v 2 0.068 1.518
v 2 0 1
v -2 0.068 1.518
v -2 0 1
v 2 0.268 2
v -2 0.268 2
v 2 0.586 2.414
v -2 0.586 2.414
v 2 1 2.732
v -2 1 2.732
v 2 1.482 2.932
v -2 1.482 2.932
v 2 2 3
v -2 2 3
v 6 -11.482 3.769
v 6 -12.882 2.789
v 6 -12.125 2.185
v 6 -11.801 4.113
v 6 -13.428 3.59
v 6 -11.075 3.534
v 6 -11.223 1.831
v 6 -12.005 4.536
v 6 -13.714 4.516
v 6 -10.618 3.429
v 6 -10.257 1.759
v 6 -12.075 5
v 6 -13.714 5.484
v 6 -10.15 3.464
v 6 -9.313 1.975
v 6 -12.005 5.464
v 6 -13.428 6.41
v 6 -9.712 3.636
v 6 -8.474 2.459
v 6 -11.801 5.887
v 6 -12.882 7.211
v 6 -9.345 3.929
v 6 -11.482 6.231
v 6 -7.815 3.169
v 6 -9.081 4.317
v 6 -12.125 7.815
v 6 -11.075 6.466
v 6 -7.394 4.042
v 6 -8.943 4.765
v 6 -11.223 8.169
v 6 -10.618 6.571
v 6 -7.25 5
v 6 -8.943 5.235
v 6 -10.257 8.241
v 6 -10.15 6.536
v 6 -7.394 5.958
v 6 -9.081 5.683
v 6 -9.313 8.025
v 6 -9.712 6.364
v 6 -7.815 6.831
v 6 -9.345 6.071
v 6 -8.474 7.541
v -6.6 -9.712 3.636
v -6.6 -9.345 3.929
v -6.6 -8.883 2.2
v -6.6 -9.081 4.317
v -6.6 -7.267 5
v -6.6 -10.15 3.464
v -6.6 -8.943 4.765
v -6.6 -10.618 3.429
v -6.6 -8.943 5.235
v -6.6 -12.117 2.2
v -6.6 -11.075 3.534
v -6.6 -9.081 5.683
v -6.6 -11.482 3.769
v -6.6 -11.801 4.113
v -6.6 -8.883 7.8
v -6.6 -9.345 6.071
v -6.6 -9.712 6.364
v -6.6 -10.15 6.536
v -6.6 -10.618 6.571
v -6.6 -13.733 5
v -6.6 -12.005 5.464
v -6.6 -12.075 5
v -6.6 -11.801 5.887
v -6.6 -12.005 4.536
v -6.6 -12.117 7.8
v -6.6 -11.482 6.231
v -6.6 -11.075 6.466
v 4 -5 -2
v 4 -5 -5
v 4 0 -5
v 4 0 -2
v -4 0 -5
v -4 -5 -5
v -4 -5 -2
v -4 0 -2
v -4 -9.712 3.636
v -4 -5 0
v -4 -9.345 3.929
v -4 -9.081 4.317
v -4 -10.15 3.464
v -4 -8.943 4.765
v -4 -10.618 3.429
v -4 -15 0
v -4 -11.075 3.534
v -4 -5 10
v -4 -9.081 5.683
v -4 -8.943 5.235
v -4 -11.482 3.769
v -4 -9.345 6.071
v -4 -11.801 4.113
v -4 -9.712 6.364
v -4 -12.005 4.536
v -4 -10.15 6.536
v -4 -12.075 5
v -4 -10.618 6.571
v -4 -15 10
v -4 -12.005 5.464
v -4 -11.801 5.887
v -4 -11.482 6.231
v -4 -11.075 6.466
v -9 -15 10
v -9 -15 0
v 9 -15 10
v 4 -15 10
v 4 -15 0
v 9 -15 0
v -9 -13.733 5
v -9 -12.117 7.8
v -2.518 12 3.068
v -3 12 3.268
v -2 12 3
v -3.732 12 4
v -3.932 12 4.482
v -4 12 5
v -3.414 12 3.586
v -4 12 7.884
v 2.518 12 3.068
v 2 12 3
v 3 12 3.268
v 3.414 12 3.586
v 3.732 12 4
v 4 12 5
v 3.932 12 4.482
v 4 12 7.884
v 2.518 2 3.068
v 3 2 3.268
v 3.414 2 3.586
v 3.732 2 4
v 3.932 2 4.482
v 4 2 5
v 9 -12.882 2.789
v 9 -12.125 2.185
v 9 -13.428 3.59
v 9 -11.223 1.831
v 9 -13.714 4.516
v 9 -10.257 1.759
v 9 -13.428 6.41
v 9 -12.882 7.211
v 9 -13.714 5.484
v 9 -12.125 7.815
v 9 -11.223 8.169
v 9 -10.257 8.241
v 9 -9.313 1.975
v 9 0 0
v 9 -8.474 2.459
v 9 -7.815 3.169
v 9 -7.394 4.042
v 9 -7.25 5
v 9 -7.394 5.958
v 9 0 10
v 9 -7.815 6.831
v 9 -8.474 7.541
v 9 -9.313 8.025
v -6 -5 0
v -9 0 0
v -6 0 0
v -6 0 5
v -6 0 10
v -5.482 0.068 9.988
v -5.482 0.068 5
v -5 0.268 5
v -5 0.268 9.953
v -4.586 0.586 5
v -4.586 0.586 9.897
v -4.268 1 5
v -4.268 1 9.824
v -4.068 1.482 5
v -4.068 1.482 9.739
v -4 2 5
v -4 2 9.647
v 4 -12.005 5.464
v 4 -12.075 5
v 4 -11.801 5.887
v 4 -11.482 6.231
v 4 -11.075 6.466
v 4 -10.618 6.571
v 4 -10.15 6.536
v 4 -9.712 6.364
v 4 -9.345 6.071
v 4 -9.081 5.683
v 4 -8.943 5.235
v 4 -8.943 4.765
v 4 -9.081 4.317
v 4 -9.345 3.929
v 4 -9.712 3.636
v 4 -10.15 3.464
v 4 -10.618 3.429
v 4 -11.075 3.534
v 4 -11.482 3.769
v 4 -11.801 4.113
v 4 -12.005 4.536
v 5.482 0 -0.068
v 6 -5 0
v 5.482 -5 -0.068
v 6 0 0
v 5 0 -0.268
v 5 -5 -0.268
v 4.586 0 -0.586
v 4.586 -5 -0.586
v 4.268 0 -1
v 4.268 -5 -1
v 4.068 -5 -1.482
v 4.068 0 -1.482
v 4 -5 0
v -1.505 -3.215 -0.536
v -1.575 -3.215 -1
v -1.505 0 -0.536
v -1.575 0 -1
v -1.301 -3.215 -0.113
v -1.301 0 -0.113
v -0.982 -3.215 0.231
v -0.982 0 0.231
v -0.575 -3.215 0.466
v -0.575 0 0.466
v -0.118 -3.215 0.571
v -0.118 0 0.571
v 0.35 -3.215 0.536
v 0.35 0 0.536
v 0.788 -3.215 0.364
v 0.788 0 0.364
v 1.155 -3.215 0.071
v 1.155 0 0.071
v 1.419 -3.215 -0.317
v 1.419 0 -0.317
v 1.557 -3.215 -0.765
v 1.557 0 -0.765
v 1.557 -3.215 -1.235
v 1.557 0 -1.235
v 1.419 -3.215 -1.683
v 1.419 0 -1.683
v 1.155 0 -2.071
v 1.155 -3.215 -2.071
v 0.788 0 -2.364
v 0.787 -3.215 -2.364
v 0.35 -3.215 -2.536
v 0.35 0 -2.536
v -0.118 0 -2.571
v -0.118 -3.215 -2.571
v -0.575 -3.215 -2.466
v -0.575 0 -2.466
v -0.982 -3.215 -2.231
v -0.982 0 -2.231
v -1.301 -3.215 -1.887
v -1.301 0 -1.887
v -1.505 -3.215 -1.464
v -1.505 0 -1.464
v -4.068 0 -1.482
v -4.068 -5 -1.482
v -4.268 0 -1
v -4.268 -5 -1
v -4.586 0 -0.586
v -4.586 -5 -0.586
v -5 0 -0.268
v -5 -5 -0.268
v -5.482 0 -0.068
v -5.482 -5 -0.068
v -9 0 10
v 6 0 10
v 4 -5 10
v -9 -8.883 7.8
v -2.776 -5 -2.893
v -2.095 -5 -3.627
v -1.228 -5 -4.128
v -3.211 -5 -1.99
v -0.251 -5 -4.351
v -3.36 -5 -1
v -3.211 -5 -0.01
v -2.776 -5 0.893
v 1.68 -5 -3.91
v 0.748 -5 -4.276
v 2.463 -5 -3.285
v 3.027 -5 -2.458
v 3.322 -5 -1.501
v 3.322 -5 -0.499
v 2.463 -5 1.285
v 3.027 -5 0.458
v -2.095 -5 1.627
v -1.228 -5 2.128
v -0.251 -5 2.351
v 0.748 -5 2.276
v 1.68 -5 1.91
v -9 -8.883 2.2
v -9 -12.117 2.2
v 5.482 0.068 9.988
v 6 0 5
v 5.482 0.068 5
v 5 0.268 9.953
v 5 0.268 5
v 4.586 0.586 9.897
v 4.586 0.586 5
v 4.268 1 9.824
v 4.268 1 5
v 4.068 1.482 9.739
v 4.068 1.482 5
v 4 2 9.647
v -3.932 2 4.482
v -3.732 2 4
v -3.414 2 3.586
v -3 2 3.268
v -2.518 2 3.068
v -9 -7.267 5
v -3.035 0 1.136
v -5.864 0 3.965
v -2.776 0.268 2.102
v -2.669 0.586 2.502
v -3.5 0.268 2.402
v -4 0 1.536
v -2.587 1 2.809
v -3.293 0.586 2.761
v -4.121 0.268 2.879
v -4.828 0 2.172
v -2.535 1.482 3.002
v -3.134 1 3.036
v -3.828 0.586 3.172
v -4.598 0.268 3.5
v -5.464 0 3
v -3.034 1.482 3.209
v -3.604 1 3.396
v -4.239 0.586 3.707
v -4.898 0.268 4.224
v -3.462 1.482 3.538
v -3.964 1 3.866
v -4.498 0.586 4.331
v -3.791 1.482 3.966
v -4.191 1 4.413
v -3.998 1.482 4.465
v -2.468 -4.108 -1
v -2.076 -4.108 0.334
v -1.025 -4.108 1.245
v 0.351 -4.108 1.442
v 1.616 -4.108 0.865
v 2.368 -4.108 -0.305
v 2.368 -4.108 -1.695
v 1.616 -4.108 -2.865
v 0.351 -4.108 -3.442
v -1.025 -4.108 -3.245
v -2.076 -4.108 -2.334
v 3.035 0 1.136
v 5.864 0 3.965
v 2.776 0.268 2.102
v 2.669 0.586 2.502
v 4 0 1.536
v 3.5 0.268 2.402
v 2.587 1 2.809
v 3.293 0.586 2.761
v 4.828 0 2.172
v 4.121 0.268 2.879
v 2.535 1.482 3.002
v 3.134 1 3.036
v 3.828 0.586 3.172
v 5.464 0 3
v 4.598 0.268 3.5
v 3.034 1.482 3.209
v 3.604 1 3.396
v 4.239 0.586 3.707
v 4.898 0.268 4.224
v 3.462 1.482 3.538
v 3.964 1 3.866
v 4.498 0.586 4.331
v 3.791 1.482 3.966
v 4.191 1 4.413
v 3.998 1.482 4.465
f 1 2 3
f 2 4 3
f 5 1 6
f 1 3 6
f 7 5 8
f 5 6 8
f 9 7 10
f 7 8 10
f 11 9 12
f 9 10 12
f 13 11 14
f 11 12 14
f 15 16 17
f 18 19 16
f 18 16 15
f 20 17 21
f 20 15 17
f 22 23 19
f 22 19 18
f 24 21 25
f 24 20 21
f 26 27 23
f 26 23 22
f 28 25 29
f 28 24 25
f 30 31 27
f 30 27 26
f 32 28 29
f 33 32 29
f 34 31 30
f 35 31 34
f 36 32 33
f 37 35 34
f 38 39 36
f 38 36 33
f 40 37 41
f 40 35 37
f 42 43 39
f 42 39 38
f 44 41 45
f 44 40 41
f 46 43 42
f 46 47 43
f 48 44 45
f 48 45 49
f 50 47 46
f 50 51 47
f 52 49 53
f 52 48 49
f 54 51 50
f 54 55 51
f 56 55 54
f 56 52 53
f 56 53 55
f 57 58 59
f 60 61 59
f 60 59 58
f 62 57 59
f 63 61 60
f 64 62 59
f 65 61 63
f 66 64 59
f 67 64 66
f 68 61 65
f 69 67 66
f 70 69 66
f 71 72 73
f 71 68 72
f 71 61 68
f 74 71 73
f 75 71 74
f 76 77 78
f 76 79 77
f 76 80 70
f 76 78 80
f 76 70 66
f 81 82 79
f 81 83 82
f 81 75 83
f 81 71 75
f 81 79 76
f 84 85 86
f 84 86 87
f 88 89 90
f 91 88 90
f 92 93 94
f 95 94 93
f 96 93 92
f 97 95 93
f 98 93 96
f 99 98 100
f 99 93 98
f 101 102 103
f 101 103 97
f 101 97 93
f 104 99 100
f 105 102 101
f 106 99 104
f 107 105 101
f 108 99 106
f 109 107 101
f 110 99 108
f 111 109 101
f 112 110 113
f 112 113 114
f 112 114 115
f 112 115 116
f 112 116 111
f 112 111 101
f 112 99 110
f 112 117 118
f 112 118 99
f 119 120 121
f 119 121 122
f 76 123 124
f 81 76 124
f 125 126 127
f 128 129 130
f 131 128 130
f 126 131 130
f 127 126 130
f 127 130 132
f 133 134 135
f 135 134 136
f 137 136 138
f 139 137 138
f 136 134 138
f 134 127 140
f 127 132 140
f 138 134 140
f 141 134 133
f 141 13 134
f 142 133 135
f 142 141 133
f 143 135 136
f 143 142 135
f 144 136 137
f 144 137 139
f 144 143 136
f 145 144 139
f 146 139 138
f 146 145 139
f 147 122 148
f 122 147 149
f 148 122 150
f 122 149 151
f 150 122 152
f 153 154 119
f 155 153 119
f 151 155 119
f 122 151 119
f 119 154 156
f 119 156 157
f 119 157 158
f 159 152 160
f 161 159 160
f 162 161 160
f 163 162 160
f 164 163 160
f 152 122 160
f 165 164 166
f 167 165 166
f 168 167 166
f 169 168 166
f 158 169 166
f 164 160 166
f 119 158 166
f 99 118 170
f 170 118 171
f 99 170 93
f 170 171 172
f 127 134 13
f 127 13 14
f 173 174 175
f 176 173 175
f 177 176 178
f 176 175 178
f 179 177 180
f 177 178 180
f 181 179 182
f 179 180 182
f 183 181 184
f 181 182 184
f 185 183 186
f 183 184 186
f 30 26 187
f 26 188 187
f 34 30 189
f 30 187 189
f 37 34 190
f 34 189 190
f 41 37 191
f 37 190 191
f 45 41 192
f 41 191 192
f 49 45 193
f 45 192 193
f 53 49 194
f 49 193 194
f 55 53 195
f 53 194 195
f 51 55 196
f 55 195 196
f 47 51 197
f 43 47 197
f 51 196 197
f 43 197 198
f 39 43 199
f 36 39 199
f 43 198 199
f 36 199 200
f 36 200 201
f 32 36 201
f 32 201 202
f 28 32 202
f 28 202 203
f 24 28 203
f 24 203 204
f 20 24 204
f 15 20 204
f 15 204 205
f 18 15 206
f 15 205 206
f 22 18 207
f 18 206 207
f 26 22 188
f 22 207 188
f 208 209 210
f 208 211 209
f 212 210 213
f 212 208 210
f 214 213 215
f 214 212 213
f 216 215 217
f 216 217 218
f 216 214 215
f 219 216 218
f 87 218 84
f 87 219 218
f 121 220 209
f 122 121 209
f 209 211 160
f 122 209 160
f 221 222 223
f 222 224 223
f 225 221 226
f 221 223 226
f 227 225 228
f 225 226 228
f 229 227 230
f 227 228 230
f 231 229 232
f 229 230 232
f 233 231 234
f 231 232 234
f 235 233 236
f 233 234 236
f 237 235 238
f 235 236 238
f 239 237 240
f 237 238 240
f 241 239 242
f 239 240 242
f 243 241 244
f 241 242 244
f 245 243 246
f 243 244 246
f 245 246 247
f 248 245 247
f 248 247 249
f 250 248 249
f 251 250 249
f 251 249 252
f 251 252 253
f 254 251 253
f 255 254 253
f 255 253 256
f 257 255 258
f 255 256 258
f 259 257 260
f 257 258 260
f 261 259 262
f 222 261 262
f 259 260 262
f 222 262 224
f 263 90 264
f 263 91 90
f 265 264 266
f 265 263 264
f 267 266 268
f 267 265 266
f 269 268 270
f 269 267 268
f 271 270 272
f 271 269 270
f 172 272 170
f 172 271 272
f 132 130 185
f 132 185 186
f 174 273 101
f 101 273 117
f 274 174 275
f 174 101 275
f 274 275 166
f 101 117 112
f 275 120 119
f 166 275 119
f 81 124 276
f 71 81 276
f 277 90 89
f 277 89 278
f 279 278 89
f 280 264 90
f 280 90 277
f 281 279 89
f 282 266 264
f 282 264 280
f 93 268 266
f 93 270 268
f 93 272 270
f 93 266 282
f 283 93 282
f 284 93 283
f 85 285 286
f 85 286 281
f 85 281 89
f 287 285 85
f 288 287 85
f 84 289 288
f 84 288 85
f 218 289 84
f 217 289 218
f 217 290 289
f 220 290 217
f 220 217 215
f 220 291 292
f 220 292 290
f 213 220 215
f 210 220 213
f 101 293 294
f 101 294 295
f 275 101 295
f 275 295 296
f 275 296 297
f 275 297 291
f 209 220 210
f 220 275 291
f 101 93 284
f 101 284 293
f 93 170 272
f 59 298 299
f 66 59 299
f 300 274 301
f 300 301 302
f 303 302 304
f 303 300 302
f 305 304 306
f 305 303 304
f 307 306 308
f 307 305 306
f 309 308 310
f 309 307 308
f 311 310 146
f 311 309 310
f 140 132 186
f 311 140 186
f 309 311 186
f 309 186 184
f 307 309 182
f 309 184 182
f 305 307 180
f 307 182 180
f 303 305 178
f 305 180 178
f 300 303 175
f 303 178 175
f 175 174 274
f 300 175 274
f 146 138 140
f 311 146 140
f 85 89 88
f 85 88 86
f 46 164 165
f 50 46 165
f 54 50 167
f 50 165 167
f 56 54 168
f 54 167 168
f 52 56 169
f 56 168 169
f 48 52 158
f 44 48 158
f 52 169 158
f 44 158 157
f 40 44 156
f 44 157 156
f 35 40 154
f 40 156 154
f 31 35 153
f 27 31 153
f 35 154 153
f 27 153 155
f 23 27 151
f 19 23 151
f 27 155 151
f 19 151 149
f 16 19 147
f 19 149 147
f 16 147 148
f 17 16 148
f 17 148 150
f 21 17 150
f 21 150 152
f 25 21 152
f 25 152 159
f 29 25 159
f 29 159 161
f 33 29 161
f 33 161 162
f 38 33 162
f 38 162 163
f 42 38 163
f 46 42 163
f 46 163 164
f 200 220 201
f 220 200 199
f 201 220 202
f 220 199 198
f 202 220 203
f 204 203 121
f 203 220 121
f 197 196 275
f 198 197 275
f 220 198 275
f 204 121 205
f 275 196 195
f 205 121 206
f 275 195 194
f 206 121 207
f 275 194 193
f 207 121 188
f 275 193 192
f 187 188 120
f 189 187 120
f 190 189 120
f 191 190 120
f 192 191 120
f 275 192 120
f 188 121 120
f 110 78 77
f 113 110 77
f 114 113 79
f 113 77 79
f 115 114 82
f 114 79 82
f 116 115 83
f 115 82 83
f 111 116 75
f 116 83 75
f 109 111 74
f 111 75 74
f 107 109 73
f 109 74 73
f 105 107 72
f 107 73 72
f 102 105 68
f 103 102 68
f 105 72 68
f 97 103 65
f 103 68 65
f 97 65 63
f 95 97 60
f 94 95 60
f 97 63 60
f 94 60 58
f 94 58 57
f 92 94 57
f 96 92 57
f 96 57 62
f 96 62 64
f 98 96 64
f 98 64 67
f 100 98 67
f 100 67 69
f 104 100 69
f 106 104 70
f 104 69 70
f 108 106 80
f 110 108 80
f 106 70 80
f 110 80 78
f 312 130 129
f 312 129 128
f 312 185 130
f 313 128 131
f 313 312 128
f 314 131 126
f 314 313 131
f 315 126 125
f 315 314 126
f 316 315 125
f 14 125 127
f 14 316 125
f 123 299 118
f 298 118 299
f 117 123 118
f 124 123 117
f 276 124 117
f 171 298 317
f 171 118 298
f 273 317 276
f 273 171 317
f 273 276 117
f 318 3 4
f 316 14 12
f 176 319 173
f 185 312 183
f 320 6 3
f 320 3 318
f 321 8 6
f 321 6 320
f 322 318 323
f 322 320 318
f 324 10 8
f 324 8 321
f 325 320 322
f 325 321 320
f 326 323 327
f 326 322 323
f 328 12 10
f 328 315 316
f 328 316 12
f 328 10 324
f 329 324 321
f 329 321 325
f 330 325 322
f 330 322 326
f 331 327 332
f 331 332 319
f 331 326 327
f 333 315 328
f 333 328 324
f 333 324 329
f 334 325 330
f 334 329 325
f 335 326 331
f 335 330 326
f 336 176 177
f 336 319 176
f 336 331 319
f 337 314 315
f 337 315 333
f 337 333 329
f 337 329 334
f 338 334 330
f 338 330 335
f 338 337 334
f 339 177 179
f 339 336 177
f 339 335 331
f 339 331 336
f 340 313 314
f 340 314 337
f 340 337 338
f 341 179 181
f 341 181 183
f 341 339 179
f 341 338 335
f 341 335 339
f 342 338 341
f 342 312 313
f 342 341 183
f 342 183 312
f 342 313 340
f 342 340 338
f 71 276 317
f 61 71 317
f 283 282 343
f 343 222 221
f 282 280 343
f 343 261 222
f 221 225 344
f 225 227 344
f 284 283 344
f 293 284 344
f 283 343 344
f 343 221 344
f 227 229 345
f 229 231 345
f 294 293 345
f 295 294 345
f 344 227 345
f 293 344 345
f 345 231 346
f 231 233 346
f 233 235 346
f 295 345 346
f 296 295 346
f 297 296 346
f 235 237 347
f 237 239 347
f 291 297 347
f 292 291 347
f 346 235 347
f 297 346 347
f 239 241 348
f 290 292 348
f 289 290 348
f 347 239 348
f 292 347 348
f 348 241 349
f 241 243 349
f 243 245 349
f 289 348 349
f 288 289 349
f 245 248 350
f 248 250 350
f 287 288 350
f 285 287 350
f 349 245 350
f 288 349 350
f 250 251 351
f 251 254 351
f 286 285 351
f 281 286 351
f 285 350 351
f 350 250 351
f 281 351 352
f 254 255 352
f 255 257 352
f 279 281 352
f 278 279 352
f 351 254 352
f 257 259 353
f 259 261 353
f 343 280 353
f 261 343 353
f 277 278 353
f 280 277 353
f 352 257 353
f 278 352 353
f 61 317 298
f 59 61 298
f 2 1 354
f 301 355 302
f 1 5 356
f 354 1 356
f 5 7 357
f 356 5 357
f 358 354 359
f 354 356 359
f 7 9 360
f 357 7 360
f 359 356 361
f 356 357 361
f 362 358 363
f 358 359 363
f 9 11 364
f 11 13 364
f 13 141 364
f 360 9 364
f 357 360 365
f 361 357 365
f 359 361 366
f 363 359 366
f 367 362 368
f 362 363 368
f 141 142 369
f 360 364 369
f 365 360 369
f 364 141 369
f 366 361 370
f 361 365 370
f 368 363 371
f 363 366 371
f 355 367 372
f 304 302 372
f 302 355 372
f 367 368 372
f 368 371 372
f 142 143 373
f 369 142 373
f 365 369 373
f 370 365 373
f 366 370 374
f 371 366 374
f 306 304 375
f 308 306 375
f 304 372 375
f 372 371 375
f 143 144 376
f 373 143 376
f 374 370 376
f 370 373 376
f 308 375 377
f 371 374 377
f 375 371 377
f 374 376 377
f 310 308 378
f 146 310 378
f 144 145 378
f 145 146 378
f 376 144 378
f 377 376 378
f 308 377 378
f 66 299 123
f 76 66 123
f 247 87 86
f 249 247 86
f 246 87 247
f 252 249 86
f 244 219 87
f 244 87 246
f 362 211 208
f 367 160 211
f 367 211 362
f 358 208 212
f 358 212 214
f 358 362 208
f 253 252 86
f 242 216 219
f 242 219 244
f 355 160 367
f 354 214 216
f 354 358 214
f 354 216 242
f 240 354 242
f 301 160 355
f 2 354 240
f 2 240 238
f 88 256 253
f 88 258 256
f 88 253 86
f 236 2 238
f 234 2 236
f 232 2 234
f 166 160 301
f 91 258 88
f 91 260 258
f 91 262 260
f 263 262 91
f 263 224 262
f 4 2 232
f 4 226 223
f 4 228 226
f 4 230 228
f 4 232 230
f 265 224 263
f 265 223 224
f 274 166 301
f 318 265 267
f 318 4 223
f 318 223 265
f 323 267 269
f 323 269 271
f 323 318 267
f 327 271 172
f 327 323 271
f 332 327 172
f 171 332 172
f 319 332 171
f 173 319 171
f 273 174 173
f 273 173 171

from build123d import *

# Parameters (mm, degrees)
F0_W            = 18
F0_H            = 10
F1_DEPTH        = 15
F2_W            = 8
F2_H            = 10
F3_DEPTH        = 10
F5_D            = 3.15
F5_CBORE_D      = 6.5
F5_CBORE_DEPTH  = 3
F7_DEPTH        = 2.4
F8_W            = 8
F8_H            = 15
F9_DEPTH        = 17
F10_W           = 8
F10_H           = 8
F11_DEPTH       = 12
F13_D           = 3.15
F13_CSINK_D     = 6.72
F13_CSINK_ANGLE = 90
F15_DEPTH       = 25
F16_R           = 2


with BuildPart() as f1:
    # F0 (on Front) → F1 (new body)
    with BuildSketch(Plane.XZ):
        with Locations((0, 5)):
            Rectangle(F0_W, F0_H)
    extrude(amount=F1_DEPTH)

    # F2 (on face) → F3 (cut)
    with BuildSketch(Plane.XZ.offset(15)):
        with Locations((0, 5)):
            Rectangle(F2_W, F2_H)
    extrude(amount=-F3_DEPTH, mode=Mode.SUBTRACT)

    # F5 (through all)
    with Locations(Plane.YZ.offset(9)):
        with Locations((-10.5, 5)):
            CounterBoreHole(F5_D / 2, F5_CBORE_D / 2, F5_CBORE_DEPTH)

    # F6 (on face) → F7 (cut)
    with BuildSketch(Plane(origin=(-9, 0, 0), x_dir=(0, -1, 0), z_dir=(-1, 0, 0))):
        Polygon((12.1165807537, 2.2), (13.7331615075, 5), (12.1165807537, 7.8), (8.8834192463, 7.8), (7.2668384925, 5), (8.8834192463, 2.2), align=None)
    extrude(amount=-F7_DEPTH, mode=Mode.SUBTRACT)

    # F8 (on face) → F9 (join)
    with BuildSketch(Plane.XZ.offset(5)):
        with Locations((0, 2.5)):
            Rectangle(F8_W, F8_H)
    extrude(amount=-F9_DEPTH)

    # F10 (on face) → F11 (cut, through all)
    with BuildSketch(Plane(origin=(0, 12, 0), x_dir=(-1, 0, 0), z_dir=(0, 1, 0))):
        with Locations((0, -1)):
            Rectangle(F10_W, F10_H)
    extrude(amount=-F11_DEPTH, mode=Mode.SUBTRACT)

    # F13 (through all)
    with Locations(Plane.XZ.offset(5)):
        with Locations((0, -1)):
            CounterSinkHole(F13_D / 2, F13_CSINK_D / 2, counter_sink_angle=F13_CSINK_ANGLE)

    # F14 (on face) → F15 (cut)
    with BuildSketch(Plane(origin=(-4, 0, 0), x_dir=(0, -1, 0), z_dir=(-1, 0, 0))):
        Polygon((-12, 7.8840762315), (0, 10), (-12, 10), align=None)
    extrude(amount=-F15_DEPTH, mode=Mode.SUBTRACT)

    # F16 (call 1 of 3: OpenCascade refuses the feature's edges together)
    f16_edges = [f1.edges().sort_by_distance(p)[0] for p in [
        (-4, -2.5, 0),
    ]]
    fillet(f16_edges, radius=F16_R)

    # F16#2 (call 2 of 3)
    f16_2_edges = [f1.edges().sort_by_distance(p)[0] for p in [
        (0, 0, 3),
        (-4, 0, 6.5),
        (4, 0, 6.5),
        (-4, 6, 3),
        (4, 6, 3),
    ]]
    fillet(f16_2_edges, radius=F16_R)

    # F16#3 (call 3 of 3)
    f16_3_edges = [f1.edges().sort_by_distance(p)[0] for p in [
        (4, -2.5, 0),
    ]]
    fillet(f16_3_edges, radius=F16_R)


solid = f1.part
